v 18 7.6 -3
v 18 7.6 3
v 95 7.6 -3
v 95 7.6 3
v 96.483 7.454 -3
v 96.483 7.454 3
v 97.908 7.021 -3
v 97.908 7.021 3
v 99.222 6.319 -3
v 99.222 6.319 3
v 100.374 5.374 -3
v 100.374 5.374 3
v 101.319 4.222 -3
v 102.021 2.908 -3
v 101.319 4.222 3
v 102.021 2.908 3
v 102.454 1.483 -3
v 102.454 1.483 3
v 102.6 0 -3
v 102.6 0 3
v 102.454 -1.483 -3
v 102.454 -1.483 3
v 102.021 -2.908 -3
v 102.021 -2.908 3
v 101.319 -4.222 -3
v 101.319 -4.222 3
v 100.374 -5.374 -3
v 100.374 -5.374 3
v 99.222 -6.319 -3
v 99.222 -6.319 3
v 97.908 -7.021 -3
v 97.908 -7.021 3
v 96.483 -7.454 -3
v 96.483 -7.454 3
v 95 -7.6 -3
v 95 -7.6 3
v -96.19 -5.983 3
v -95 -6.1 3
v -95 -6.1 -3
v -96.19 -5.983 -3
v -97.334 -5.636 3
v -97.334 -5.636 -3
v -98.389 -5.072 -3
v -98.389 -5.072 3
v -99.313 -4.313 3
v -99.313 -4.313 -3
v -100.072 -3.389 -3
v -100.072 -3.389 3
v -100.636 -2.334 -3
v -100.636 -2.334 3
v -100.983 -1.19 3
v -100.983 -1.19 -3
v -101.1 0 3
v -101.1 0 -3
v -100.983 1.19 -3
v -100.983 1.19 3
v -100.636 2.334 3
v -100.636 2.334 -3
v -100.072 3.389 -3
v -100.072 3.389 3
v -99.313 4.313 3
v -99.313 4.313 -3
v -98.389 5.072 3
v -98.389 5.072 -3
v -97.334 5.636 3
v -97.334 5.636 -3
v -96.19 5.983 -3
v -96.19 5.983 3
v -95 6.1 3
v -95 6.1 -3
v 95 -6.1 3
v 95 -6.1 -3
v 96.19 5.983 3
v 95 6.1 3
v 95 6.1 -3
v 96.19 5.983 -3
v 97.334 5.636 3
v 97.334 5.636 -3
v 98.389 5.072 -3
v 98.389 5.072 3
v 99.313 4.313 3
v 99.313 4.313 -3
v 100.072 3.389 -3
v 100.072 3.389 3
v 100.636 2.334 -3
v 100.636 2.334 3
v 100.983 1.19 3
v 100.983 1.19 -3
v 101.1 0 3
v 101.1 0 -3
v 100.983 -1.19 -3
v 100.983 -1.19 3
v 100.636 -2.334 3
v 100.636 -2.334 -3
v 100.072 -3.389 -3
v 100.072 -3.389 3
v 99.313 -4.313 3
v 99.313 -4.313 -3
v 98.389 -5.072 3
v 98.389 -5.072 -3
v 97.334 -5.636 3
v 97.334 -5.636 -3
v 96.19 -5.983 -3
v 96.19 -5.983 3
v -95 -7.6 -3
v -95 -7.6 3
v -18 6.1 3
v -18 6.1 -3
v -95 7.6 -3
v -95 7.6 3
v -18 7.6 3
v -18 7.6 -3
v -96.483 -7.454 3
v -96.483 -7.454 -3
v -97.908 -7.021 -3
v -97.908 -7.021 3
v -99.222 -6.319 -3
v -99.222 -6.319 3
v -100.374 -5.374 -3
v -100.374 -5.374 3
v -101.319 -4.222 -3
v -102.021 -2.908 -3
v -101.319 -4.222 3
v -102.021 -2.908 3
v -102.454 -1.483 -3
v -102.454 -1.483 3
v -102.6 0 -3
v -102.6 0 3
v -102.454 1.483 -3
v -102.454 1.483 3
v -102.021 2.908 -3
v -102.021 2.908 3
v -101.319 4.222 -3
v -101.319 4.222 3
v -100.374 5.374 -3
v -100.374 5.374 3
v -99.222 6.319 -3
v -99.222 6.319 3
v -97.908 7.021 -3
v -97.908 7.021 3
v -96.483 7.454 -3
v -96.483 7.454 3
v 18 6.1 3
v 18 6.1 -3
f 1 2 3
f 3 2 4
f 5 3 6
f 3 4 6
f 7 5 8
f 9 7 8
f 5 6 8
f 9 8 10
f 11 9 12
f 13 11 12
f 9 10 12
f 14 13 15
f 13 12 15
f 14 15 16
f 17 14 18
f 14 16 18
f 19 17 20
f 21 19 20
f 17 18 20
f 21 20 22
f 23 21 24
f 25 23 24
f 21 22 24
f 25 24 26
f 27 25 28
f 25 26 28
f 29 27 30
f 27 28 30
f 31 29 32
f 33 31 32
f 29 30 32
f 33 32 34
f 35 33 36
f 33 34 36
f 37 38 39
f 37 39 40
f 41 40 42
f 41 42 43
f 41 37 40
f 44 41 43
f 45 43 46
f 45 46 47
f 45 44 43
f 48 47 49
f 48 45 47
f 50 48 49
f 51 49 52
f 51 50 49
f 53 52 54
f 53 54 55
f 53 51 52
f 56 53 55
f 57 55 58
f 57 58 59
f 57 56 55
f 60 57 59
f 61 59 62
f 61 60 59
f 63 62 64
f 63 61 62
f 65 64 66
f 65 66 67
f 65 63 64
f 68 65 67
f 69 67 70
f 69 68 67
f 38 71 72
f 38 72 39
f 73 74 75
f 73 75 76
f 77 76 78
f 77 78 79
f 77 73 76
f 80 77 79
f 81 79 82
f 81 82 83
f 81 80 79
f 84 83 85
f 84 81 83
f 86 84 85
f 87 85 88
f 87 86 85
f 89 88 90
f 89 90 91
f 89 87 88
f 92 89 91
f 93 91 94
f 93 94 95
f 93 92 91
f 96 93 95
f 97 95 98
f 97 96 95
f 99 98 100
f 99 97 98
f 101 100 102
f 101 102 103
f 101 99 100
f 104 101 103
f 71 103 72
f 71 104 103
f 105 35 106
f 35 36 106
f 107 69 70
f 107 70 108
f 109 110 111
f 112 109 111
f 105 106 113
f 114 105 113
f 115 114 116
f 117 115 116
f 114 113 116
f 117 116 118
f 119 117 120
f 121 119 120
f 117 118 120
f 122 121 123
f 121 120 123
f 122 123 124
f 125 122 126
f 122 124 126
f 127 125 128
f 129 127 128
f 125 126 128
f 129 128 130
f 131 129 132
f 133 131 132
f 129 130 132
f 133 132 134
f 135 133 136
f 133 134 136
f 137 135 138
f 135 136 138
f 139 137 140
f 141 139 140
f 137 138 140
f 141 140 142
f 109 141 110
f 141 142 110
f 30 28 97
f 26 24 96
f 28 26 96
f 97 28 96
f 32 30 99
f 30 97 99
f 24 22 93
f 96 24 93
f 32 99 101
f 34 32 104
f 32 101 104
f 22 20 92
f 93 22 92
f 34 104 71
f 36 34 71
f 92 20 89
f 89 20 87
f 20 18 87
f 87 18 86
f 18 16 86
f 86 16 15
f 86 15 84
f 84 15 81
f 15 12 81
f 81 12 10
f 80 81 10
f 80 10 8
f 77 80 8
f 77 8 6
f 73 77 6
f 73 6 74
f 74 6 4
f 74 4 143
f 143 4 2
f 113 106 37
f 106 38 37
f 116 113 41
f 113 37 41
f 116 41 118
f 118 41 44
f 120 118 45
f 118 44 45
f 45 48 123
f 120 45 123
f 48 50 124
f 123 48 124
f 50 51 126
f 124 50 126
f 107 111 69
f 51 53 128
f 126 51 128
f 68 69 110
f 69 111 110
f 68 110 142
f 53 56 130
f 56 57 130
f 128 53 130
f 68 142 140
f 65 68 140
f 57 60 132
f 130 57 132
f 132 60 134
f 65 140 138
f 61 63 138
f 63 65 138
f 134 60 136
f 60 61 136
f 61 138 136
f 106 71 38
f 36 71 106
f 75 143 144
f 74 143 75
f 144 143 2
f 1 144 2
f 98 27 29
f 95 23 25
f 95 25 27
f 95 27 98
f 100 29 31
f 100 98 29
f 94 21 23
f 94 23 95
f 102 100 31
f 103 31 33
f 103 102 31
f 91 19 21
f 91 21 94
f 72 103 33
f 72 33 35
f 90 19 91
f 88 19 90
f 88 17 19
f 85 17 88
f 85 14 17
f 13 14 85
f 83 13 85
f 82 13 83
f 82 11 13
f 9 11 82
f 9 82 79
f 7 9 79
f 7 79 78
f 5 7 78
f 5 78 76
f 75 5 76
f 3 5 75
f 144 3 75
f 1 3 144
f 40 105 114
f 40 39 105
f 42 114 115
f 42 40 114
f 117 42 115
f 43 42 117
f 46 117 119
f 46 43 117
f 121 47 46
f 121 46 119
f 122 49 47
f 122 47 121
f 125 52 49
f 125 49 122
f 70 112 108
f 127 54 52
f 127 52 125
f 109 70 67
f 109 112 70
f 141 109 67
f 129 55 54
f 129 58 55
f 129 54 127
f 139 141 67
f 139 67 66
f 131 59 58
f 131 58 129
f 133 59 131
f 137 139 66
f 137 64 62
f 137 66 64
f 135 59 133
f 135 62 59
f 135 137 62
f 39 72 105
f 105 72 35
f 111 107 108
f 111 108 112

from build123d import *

# Parameters (mm, degrees)
AUFSATZ_LINEAR_AUSTRAGEN1_DEPTH = 3
SKIZZE2_W                       = 36
SKIZZE2_H                       = 1.5
SCHNITT_LINEAR_AUSTRAGEN1_DEPTH = 7


with BuildPart() as part:
    # Skizze1 → Aufsatz-Linear austragen1 (new body, symmetric)
    with BuildSketch(Plane.XY):
        with BuildLine():
            Line((-95, 7.6), (95, 7.6))
            ThreePointArc((95, 7.6), (102.6, 0), (95, -7.6))
            Line((95, -7.6), (-95, -7.6))
            ThreePointArc((-95, -7.6), (-102.6, 0), (-95, 7.6))
        make_face()
        with BuildLine():
            Line((-95, 6.1), (95, 6.1))
            ThreePointArc((95, 6.1), (101.1, 0), (95, -6.1))
            Line((95, -6.1), (-95, -6.1))
            ThreePointArc((-95, -6.1), (-101.1, 0), (-95, 6.1))
        make_face(mode=Mode.SUBTRACT)
    extrude(amount=AUFSATZ_LINEAR_AUSTRAGEN1_DEPTH, both=True)

    # Skizze2 → Schnitt-Linear austragen1 (cut, through all)
    with BuildSketch(Plane.XY.offset(3)):
        with Locations((0, 6.85)):
            Rectangle(SKIZZE2_W, SKIZZE2_H)
    extrude(amount=-SCHNITT_LINEAR_AUSTRAGEN1_DEPTH, mode=Mode.SUBTRACT)


solid = part.part
